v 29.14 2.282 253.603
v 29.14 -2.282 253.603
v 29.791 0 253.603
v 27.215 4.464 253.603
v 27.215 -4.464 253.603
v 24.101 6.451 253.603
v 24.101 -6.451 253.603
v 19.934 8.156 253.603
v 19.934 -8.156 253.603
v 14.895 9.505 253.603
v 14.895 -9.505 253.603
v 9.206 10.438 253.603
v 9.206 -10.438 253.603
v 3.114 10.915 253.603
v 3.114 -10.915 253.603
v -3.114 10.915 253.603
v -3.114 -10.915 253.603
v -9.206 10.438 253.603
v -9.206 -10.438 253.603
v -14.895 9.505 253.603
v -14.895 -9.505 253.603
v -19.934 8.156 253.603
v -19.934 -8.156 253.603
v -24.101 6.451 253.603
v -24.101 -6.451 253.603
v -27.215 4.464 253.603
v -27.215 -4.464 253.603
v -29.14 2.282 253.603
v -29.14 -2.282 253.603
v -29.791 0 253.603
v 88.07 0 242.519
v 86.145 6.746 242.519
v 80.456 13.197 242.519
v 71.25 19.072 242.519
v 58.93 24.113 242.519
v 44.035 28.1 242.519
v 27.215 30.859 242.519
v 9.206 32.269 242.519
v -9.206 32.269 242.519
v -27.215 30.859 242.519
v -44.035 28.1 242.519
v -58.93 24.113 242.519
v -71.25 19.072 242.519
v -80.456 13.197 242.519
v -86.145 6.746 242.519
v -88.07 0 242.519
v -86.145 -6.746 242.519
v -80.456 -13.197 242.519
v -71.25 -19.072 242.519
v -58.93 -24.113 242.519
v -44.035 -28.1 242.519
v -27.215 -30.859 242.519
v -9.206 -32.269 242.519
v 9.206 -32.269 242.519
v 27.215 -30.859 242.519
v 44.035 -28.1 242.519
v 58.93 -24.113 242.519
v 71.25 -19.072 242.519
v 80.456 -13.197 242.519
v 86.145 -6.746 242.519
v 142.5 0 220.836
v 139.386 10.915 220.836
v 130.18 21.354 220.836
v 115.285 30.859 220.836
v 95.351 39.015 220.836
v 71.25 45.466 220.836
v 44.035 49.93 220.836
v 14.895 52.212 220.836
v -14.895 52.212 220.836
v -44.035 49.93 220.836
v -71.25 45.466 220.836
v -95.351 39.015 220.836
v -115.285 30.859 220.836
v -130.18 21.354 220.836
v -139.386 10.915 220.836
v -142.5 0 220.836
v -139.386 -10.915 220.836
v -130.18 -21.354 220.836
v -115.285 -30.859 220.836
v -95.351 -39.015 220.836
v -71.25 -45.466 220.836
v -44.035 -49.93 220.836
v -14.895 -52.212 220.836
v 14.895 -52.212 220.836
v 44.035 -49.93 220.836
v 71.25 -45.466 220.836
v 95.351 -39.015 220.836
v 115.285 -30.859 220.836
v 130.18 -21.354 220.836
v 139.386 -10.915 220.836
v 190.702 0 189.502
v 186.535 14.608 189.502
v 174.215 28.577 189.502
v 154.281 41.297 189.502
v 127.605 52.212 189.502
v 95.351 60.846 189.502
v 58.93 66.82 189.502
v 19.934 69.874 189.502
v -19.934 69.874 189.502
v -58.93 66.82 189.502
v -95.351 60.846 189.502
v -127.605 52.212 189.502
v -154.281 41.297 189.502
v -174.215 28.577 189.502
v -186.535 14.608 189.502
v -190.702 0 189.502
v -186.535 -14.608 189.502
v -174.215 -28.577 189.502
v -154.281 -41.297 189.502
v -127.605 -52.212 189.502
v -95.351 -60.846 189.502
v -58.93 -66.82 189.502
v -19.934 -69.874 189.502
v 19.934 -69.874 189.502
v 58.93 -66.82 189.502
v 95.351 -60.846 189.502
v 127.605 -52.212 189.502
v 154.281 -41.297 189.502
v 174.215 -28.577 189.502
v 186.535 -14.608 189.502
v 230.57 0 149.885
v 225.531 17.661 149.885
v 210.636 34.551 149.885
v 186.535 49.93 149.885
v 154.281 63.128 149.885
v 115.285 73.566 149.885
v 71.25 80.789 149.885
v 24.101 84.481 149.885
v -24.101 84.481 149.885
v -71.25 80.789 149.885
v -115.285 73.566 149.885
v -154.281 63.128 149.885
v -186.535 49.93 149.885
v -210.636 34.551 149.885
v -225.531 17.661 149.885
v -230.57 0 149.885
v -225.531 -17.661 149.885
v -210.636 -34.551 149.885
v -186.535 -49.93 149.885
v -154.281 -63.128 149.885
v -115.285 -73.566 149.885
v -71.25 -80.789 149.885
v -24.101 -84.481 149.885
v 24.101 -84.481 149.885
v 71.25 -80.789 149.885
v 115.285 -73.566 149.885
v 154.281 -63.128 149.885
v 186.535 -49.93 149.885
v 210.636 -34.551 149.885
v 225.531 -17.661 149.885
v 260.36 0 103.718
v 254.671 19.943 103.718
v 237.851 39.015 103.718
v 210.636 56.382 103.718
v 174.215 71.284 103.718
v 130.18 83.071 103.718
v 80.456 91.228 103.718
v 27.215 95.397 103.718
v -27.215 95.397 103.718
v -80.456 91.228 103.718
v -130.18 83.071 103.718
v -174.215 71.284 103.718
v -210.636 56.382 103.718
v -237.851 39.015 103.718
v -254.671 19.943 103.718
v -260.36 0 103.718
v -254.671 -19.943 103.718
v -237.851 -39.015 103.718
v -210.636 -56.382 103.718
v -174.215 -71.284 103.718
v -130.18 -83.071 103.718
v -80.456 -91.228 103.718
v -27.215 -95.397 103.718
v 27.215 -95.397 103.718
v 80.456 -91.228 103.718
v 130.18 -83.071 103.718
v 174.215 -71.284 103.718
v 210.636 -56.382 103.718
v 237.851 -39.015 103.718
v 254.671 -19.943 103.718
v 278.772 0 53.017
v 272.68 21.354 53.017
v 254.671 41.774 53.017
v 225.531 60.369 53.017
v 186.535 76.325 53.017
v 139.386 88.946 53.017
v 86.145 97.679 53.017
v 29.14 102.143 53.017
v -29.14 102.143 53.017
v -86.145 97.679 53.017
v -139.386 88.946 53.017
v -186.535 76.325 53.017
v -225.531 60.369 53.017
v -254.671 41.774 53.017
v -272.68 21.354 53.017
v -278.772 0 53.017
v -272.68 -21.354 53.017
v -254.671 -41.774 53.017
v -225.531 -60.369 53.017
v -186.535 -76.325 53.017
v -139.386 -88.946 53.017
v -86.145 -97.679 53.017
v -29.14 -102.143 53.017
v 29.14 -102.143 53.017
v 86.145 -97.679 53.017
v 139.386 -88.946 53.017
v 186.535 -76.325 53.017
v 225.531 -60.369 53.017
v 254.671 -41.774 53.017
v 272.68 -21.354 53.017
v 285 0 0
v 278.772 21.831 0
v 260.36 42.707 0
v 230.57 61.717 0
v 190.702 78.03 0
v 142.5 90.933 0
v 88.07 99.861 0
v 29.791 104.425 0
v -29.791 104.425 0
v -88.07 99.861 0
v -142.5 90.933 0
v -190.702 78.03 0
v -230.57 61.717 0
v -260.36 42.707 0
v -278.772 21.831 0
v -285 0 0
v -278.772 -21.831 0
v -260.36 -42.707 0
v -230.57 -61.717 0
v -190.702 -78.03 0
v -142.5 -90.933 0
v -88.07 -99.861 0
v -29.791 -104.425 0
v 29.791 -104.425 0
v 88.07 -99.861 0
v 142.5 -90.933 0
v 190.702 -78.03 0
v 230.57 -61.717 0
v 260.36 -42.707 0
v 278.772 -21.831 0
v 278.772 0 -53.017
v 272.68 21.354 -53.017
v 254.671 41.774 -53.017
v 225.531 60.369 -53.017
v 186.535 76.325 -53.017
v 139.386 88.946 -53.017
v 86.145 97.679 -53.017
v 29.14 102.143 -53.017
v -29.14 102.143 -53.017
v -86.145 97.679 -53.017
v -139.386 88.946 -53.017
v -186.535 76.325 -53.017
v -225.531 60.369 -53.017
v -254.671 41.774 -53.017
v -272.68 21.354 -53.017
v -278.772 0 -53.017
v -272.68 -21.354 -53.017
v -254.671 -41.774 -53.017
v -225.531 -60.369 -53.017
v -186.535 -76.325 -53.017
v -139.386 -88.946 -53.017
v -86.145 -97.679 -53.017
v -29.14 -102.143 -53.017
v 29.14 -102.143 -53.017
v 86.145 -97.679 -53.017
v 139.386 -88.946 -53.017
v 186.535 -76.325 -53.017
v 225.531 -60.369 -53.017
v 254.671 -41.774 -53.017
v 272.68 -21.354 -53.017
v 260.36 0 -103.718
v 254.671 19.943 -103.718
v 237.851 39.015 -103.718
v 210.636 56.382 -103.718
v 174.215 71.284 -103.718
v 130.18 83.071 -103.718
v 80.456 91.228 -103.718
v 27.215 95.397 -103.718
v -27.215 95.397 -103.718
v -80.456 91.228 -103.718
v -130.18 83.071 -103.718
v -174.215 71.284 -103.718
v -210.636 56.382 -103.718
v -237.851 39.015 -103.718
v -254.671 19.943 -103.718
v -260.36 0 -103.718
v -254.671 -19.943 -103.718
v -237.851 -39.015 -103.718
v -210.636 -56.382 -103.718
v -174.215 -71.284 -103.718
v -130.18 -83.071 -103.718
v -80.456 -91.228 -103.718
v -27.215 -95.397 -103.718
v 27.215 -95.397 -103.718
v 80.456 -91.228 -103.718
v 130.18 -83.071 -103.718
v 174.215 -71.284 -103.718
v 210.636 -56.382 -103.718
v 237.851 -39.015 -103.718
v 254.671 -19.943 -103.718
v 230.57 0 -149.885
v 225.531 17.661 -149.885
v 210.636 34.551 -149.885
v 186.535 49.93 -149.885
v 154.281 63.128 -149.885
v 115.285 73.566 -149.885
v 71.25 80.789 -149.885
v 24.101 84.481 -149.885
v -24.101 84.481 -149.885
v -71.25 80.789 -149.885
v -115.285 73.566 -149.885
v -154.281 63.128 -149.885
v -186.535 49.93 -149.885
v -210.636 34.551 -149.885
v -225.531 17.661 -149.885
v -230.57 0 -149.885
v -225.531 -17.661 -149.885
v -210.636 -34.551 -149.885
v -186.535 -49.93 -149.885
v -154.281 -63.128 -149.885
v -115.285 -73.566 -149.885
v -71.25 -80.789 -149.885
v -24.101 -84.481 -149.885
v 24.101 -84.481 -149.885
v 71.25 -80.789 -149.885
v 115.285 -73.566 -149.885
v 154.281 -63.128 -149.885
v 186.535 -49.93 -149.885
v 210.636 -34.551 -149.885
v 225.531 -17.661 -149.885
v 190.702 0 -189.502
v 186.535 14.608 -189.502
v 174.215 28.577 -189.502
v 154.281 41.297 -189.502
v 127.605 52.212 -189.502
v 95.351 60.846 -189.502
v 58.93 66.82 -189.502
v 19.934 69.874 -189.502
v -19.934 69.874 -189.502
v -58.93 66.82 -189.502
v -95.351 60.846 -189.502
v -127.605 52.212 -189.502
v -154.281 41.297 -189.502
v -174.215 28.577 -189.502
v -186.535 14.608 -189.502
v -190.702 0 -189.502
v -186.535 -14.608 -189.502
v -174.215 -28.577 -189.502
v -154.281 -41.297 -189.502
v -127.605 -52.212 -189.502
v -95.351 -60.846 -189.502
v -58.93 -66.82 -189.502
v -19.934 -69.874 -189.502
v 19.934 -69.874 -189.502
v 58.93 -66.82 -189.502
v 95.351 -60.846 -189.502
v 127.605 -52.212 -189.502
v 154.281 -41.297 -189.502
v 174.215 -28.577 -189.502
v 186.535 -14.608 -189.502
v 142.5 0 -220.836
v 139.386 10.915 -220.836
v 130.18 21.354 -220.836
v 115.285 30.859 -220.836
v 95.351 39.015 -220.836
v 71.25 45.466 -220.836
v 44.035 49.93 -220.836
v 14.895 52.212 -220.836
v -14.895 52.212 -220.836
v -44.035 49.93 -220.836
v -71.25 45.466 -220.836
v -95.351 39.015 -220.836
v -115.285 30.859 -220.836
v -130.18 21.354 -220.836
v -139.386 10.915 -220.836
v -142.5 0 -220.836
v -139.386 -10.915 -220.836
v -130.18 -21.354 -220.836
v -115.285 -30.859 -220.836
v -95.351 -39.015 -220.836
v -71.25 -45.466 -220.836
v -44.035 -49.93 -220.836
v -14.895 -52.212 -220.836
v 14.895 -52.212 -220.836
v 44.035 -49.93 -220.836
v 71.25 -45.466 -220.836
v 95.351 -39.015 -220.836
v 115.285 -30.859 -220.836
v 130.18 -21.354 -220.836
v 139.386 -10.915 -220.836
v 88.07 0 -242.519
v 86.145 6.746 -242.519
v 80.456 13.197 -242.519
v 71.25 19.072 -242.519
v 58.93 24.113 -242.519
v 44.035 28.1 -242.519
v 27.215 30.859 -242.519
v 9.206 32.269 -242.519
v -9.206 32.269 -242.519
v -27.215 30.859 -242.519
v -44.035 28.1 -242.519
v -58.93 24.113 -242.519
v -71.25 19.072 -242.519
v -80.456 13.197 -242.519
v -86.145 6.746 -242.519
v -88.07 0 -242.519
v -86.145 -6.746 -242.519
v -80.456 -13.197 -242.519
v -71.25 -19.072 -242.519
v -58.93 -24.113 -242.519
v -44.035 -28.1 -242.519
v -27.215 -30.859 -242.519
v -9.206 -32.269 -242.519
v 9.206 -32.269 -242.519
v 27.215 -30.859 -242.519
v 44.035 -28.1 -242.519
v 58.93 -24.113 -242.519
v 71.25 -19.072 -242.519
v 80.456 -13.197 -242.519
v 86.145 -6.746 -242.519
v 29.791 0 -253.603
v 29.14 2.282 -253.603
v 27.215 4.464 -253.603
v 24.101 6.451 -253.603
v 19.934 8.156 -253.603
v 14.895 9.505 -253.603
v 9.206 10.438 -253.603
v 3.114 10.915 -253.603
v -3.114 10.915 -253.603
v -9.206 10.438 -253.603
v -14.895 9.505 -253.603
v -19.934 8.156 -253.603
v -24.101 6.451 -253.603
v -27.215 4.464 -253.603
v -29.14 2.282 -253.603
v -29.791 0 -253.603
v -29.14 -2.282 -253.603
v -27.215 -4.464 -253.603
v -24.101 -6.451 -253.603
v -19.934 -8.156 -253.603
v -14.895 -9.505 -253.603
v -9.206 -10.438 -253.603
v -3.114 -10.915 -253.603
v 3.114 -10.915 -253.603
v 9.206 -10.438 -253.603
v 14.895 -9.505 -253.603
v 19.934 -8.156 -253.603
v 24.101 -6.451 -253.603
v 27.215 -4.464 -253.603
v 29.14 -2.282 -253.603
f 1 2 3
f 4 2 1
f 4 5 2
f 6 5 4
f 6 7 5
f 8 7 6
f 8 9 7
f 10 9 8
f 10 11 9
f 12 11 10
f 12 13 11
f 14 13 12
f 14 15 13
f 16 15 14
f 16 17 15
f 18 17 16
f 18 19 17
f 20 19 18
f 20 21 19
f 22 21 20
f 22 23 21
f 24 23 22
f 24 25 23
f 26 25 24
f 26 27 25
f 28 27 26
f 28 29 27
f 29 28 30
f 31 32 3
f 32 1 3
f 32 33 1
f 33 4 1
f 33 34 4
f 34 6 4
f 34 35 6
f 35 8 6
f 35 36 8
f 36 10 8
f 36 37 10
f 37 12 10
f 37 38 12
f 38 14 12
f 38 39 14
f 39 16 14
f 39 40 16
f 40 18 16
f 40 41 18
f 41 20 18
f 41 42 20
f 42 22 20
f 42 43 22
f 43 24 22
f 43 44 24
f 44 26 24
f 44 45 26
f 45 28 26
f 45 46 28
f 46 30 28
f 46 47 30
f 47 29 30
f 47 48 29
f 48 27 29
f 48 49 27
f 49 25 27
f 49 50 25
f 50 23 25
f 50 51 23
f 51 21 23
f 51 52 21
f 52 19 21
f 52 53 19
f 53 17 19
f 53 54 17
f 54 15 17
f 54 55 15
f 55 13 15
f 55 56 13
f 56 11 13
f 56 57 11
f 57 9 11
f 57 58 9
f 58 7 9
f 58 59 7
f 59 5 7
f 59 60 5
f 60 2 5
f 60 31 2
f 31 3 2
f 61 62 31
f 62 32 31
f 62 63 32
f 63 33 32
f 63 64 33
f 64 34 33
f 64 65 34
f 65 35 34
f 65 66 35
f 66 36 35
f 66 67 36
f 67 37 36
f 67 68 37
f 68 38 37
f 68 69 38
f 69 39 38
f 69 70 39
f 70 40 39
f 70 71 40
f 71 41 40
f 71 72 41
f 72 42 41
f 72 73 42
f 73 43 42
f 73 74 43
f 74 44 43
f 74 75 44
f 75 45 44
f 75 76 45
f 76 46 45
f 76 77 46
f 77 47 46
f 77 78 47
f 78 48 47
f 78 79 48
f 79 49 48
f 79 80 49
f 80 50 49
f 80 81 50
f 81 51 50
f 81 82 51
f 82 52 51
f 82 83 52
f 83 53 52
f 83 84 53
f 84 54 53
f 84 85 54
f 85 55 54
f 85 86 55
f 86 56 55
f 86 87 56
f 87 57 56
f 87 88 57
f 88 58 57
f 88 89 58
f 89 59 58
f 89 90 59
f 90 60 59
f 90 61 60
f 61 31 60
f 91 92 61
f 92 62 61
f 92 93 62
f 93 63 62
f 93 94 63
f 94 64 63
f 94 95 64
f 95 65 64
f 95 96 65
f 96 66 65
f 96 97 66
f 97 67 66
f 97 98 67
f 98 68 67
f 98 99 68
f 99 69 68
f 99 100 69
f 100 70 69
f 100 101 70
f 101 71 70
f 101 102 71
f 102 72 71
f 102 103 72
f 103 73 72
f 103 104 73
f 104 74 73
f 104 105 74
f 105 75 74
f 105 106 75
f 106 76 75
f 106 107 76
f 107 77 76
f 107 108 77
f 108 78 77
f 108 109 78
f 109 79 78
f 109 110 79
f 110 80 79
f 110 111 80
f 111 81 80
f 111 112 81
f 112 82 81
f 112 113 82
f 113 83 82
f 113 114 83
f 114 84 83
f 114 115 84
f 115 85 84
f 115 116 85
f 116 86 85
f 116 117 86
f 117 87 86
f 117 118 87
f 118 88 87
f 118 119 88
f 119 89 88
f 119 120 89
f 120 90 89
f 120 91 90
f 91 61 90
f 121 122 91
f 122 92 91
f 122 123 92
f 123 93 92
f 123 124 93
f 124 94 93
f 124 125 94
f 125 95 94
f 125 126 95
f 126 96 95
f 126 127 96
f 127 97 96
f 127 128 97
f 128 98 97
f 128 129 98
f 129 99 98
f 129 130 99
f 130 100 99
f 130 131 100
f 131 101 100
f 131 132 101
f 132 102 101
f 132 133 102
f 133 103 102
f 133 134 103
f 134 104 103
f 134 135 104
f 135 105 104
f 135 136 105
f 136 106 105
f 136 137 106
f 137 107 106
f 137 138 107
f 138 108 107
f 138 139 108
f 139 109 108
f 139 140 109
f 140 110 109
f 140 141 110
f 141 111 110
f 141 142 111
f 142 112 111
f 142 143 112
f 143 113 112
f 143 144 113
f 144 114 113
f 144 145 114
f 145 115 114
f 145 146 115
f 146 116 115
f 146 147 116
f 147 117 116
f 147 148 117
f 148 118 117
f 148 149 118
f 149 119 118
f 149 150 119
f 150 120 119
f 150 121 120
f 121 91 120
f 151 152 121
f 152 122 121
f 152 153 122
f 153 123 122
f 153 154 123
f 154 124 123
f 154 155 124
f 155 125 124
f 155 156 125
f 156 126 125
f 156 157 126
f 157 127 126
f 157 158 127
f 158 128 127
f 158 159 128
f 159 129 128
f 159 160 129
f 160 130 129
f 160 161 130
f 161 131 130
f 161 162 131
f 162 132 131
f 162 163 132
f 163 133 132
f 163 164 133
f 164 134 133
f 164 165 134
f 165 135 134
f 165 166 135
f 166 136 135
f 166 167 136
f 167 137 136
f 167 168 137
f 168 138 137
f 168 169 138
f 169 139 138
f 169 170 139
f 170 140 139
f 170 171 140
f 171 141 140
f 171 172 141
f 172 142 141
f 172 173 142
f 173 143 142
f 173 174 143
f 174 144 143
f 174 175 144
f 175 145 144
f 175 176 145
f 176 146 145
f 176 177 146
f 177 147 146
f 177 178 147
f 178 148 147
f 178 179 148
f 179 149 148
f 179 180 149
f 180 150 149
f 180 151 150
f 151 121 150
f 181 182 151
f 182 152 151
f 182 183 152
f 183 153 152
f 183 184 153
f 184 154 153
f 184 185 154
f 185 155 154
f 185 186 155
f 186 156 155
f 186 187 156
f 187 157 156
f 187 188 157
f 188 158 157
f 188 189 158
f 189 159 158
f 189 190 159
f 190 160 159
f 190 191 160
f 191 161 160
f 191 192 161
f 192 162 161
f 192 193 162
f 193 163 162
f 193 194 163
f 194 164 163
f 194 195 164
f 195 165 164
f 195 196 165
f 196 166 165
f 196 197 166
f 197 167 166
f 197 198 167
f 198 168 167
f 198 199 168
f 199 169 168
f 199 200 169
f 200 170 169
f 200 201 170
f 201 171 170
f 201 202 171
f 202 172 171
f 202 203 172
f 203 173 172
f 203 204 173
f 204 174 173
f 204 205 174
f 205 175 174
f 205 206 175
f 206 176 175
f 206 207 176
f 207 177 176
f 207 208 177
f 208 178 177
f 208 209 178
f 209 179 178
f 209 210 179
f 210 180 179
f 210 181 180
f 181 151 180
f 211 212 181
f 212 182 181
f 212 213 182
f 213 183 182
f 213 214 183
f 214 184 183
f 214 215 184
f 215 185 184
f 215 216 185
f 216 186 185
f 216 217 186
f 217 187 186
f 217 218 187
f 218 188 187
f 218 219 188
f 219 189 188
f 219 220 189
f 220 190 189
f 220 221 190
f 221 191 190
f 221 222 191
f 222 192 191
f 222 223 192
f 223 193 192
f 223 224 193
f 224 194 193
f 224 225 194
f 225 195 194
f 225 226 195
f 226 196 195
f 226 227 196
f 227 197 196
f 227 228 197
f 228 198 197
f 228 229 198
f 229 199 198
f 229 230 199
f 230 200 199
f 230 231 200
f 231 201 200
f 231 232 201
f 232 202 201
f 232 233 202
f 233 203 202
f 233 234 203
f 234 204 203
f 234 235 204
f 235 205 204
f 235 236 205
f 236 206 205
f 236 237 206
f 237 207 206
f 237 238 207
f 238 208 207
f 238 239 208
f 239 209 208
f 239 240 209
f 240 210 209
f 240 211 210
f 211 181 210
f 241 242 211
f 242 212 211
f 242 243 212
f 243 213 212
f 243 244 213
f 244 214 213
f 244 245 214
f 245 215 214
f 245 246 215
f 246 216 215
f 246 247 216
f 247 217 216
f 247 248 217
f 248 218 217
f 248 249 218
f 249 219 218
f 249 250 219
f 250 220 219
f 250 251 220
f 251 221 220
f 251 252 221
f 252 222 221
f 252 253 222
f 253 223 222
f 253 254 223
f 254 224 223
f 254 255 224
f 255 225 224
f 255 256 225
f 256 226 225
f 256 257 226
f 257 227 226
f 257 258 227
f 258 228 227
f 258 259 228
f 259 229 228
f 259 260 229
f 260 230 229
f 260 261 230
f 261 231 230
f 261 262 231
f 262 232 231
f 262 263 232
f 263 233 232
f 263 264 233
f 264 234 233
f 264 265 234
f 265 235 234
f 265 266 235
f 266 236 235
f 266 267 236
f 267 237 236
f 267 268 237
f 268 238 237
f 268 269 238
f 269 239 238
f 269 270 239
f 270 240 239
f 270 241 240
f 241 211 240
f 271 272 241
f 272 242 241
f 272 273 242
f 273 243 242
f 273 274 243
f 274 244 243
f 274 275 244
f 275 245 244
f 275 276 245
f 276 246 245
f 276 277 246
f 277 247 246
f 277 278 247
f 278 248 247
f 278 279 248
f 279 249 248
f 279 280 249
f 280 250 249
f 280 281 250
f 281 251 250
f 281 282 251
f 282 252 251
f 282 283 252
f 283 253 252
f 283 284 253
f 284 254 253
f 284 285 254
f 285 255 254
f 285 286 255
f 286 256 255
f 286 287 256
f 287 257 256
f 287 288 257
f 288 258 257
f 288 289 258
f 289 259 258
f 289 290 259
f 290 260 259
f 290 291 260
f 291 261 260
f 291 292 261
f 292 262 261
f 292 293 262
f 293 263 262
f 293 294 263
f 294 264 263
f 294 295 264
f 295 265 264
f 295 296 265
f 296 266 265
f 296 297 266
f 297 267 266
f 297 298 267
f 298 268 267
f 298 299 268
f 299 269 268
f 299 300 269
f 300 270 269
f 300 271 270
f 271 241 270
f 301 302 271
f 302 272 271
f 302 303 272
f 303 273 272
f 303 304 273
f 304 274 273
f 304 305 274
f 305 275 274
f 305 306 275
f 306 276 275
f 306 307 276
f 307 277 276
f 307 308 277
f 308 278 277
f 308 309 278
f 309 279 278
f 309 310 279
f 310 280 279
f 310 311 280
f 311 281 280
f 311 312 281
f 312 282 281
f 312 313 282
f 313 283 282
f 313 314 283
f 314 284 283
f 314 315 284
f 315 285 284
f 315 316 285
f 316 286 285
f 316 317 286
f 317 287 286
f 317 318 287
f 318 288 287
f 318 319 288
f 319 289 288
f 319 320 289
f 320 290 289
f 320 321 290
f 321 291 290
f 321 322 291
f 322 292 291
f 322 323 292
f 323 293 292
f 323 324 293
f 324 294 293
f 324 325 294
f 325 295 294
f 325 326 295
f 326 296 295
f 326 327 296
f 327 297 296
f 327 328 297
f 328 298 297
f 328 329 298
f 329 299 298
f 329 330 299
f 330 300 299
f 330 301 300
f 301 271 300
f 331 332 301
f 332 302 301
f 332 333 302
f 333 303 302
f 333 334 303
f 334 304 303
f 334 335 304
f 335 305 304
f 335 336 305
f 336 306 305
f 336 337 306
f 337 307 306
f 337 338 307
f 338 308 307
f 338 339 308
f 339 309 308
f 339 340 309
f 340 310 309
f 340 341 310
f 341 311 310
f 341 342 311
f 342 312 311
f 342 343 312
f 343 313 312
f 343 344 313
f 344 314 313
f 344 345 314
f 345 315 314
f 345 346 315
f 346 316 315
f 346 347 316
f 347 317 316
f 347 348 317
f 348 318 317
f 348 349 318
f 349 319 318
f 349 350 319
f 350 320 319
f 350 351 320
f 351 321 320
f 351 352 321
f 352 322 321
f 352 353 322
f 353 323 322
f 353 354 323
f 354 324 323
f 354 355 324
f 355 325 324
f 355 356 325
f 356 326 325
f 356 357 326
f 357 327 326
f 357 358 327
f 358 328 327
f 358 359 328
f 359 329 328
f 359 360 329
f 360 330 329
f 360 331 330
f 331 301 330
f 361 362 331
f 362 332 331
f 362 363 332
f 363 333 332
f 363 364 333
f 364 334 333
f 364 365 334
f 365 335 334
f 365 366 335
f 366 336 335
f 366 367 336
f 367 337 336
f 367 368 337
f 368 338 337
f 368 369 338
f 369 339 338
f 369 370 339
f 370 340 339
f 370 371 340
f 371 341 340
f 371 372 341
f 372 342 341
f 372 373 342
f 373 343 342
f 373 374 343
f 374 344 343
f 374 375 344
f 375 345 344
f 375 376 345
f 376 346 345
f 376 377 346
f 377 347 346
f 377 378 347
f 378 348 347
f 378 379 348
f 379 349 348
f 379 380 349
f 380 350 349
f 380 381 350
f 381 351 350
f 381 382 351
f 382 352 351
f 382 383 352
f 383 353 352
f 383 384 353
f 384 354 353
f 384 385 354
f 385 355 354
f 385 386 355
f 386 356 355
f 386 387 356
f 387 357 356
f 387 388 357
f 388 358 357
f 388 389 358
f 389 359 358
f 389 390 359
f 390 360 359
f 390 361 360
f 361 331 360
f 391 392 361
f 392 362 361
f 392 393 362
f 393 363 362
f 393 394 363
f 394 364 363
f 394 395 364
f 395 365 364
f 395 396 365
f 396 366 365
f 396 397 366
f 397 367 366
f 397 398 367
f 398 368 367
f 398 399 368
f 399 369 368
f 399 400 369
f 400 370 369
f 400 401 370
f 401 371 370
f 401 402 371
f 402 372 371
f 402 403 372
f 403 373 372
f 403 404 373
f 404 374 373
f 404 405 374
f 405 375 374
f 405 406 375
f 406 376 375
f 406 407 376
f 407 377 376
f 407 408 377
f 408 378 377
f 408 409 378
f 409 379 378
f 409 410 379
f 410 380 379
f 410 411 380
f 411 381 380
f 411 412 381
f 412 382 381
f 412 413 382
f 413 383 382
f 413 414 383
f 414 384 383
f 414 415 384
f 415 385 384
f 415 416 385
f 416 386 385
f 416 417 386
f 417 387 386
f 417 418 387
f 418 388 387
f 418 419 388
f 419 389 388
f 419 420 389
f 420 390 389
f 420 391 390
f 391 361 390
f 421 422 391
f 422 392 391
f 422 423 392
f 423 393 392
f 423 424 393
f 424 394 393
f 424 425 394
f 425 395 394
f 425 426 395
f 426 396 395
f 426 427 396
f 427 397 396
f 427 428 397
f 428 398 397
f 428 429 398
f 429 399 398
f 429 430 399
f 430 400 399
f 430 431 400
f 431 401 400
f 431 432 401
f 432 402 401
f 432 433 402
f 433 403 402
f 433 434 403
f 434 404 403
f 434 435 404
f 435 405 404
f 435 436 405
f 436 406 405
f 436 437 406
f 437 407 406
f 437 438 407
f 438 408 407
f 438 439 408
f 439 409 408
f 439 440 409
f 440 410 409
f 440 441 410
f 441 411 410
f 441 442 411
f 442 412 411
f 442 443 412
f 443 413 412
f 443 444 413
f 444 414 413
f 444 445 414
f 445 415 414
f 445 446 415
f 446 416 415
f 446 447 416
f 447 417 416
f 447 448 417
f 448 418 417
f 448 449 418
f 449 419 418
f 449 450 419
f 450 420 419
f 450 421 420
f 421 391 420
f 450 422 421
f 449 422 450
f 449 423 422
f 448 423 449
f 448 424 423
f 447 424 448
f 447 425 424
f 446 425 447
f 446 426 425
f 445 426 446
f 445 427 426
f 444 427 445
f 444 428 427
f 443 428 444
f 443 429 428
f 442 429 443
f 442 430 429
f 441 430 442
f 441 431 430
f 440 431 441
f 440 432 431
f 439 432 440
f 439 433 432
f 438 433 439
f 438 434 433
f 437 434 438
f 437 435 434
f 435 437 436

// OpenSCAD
// Generated by SolidPython 1.0.1 on 2020-07-29 00:46:53


scale(v = [19, 7, 17]) {
	sphere(r = 15);
}
/***********************************************
*********      SolidPython code:      **********
************************************************
 
# import packages: SolidPython
from solid import *
from solid.utils import *
from itertools import chain, combinations, permutations


class Resize:

    def __init__(self, scad_file):
        self.scad_file = scad_file
        #self.scad_file = import_scad(scad_file)
        # cone/cylinder param:
        self.r1 = 0
        self.r2 = 0
        self.h = 0
        # rectangular prism param:
        self.w = 0
        self.l = 0
        # ellipse param:
        self.r = 0

    # import OpenScad code (file name corresponds to shape)


    # classify shape + parameters
    def assign(self, param1, param2, param3):
        if self.scad_file == 'cone.scad':
            self.r1 = param1
            self.r2 = param2
            self.h = param3
        elif self.scad_file == 'cylinder.scad':
            self.r1 = param1
            self.r2 = param2
            self.h = param3
        elif self.scad_file == 'rectangularPrism.scad':
            self.h = param1
            self.l = param2
            self.w = param3
        else:
            self.r = param1
            self.h = param2

    # resize parameters
    def iterate(self):
        x = range(3, 20, 2)
        i = 1
        if self.scad_file == 'cone.scad':
            tempList = list(permutations(x, 2))
            for temp in tempList:
                param1 = temp[0]
                param2 = temp[1]
                filepath = 'produced_scad_files/' + 'cone' + str(param1) + '_' + str(param2) + '_' + '.scad'
                scad_render_to_file(cylinder(h=param1, r1=param2, r2=0), filepath)

        elif self.scad_file == 'cylinder.scad':
            tempList = list(permutations(x, 3))
            for temp in tempList:
                param1 = temp[0]
                param2 = temp[1]
                filepath = 'produced_scad_files/' + 'cylinder' + str(param1) + '_' + str(param2) + '_' + '.scad'
                scad_render_to_file(cylinder(h=param1, r1=param2, r2=param2), filepath)

        elif self.scad_file == 'rectangularPrism.scad':
            tempList = list(permutations(x, 3))
            for temp in tempList:
                param1 = temp[0]
                param2 = temp[1]
                param3 = temp[2]
                filepath = 'produced_scad_files/' + 'rectangularPrism' + str(param1) + '_' + str(param2) + '_' + str(
                    param3) + '.scad'
                scad_render_to_file(cube(size=(param1, param2, param3)), filepath)

        elif self.scad_file == 'ellipse.scad':
            tempList = list(permutations(x, 4))
            for temp in tempList:
                param1 = temp[0]
                param2 = temp[1]
                param3 = temp[2]
                param4 = temp[3]
                filepath = 'produced_scad_files/' + 'ellipse' + str(param1) + '_' + str(param2) + '_' + str(param3) + '_' + str(param4) + '.scad'
                scad_render_to_file(scale([param1, param2, param3])(sphere(r=param4)), filepath)

    def render_to_scadfile(self):
        scad_render_to_file(scad, 'example.scad') 
 
************************************************/
